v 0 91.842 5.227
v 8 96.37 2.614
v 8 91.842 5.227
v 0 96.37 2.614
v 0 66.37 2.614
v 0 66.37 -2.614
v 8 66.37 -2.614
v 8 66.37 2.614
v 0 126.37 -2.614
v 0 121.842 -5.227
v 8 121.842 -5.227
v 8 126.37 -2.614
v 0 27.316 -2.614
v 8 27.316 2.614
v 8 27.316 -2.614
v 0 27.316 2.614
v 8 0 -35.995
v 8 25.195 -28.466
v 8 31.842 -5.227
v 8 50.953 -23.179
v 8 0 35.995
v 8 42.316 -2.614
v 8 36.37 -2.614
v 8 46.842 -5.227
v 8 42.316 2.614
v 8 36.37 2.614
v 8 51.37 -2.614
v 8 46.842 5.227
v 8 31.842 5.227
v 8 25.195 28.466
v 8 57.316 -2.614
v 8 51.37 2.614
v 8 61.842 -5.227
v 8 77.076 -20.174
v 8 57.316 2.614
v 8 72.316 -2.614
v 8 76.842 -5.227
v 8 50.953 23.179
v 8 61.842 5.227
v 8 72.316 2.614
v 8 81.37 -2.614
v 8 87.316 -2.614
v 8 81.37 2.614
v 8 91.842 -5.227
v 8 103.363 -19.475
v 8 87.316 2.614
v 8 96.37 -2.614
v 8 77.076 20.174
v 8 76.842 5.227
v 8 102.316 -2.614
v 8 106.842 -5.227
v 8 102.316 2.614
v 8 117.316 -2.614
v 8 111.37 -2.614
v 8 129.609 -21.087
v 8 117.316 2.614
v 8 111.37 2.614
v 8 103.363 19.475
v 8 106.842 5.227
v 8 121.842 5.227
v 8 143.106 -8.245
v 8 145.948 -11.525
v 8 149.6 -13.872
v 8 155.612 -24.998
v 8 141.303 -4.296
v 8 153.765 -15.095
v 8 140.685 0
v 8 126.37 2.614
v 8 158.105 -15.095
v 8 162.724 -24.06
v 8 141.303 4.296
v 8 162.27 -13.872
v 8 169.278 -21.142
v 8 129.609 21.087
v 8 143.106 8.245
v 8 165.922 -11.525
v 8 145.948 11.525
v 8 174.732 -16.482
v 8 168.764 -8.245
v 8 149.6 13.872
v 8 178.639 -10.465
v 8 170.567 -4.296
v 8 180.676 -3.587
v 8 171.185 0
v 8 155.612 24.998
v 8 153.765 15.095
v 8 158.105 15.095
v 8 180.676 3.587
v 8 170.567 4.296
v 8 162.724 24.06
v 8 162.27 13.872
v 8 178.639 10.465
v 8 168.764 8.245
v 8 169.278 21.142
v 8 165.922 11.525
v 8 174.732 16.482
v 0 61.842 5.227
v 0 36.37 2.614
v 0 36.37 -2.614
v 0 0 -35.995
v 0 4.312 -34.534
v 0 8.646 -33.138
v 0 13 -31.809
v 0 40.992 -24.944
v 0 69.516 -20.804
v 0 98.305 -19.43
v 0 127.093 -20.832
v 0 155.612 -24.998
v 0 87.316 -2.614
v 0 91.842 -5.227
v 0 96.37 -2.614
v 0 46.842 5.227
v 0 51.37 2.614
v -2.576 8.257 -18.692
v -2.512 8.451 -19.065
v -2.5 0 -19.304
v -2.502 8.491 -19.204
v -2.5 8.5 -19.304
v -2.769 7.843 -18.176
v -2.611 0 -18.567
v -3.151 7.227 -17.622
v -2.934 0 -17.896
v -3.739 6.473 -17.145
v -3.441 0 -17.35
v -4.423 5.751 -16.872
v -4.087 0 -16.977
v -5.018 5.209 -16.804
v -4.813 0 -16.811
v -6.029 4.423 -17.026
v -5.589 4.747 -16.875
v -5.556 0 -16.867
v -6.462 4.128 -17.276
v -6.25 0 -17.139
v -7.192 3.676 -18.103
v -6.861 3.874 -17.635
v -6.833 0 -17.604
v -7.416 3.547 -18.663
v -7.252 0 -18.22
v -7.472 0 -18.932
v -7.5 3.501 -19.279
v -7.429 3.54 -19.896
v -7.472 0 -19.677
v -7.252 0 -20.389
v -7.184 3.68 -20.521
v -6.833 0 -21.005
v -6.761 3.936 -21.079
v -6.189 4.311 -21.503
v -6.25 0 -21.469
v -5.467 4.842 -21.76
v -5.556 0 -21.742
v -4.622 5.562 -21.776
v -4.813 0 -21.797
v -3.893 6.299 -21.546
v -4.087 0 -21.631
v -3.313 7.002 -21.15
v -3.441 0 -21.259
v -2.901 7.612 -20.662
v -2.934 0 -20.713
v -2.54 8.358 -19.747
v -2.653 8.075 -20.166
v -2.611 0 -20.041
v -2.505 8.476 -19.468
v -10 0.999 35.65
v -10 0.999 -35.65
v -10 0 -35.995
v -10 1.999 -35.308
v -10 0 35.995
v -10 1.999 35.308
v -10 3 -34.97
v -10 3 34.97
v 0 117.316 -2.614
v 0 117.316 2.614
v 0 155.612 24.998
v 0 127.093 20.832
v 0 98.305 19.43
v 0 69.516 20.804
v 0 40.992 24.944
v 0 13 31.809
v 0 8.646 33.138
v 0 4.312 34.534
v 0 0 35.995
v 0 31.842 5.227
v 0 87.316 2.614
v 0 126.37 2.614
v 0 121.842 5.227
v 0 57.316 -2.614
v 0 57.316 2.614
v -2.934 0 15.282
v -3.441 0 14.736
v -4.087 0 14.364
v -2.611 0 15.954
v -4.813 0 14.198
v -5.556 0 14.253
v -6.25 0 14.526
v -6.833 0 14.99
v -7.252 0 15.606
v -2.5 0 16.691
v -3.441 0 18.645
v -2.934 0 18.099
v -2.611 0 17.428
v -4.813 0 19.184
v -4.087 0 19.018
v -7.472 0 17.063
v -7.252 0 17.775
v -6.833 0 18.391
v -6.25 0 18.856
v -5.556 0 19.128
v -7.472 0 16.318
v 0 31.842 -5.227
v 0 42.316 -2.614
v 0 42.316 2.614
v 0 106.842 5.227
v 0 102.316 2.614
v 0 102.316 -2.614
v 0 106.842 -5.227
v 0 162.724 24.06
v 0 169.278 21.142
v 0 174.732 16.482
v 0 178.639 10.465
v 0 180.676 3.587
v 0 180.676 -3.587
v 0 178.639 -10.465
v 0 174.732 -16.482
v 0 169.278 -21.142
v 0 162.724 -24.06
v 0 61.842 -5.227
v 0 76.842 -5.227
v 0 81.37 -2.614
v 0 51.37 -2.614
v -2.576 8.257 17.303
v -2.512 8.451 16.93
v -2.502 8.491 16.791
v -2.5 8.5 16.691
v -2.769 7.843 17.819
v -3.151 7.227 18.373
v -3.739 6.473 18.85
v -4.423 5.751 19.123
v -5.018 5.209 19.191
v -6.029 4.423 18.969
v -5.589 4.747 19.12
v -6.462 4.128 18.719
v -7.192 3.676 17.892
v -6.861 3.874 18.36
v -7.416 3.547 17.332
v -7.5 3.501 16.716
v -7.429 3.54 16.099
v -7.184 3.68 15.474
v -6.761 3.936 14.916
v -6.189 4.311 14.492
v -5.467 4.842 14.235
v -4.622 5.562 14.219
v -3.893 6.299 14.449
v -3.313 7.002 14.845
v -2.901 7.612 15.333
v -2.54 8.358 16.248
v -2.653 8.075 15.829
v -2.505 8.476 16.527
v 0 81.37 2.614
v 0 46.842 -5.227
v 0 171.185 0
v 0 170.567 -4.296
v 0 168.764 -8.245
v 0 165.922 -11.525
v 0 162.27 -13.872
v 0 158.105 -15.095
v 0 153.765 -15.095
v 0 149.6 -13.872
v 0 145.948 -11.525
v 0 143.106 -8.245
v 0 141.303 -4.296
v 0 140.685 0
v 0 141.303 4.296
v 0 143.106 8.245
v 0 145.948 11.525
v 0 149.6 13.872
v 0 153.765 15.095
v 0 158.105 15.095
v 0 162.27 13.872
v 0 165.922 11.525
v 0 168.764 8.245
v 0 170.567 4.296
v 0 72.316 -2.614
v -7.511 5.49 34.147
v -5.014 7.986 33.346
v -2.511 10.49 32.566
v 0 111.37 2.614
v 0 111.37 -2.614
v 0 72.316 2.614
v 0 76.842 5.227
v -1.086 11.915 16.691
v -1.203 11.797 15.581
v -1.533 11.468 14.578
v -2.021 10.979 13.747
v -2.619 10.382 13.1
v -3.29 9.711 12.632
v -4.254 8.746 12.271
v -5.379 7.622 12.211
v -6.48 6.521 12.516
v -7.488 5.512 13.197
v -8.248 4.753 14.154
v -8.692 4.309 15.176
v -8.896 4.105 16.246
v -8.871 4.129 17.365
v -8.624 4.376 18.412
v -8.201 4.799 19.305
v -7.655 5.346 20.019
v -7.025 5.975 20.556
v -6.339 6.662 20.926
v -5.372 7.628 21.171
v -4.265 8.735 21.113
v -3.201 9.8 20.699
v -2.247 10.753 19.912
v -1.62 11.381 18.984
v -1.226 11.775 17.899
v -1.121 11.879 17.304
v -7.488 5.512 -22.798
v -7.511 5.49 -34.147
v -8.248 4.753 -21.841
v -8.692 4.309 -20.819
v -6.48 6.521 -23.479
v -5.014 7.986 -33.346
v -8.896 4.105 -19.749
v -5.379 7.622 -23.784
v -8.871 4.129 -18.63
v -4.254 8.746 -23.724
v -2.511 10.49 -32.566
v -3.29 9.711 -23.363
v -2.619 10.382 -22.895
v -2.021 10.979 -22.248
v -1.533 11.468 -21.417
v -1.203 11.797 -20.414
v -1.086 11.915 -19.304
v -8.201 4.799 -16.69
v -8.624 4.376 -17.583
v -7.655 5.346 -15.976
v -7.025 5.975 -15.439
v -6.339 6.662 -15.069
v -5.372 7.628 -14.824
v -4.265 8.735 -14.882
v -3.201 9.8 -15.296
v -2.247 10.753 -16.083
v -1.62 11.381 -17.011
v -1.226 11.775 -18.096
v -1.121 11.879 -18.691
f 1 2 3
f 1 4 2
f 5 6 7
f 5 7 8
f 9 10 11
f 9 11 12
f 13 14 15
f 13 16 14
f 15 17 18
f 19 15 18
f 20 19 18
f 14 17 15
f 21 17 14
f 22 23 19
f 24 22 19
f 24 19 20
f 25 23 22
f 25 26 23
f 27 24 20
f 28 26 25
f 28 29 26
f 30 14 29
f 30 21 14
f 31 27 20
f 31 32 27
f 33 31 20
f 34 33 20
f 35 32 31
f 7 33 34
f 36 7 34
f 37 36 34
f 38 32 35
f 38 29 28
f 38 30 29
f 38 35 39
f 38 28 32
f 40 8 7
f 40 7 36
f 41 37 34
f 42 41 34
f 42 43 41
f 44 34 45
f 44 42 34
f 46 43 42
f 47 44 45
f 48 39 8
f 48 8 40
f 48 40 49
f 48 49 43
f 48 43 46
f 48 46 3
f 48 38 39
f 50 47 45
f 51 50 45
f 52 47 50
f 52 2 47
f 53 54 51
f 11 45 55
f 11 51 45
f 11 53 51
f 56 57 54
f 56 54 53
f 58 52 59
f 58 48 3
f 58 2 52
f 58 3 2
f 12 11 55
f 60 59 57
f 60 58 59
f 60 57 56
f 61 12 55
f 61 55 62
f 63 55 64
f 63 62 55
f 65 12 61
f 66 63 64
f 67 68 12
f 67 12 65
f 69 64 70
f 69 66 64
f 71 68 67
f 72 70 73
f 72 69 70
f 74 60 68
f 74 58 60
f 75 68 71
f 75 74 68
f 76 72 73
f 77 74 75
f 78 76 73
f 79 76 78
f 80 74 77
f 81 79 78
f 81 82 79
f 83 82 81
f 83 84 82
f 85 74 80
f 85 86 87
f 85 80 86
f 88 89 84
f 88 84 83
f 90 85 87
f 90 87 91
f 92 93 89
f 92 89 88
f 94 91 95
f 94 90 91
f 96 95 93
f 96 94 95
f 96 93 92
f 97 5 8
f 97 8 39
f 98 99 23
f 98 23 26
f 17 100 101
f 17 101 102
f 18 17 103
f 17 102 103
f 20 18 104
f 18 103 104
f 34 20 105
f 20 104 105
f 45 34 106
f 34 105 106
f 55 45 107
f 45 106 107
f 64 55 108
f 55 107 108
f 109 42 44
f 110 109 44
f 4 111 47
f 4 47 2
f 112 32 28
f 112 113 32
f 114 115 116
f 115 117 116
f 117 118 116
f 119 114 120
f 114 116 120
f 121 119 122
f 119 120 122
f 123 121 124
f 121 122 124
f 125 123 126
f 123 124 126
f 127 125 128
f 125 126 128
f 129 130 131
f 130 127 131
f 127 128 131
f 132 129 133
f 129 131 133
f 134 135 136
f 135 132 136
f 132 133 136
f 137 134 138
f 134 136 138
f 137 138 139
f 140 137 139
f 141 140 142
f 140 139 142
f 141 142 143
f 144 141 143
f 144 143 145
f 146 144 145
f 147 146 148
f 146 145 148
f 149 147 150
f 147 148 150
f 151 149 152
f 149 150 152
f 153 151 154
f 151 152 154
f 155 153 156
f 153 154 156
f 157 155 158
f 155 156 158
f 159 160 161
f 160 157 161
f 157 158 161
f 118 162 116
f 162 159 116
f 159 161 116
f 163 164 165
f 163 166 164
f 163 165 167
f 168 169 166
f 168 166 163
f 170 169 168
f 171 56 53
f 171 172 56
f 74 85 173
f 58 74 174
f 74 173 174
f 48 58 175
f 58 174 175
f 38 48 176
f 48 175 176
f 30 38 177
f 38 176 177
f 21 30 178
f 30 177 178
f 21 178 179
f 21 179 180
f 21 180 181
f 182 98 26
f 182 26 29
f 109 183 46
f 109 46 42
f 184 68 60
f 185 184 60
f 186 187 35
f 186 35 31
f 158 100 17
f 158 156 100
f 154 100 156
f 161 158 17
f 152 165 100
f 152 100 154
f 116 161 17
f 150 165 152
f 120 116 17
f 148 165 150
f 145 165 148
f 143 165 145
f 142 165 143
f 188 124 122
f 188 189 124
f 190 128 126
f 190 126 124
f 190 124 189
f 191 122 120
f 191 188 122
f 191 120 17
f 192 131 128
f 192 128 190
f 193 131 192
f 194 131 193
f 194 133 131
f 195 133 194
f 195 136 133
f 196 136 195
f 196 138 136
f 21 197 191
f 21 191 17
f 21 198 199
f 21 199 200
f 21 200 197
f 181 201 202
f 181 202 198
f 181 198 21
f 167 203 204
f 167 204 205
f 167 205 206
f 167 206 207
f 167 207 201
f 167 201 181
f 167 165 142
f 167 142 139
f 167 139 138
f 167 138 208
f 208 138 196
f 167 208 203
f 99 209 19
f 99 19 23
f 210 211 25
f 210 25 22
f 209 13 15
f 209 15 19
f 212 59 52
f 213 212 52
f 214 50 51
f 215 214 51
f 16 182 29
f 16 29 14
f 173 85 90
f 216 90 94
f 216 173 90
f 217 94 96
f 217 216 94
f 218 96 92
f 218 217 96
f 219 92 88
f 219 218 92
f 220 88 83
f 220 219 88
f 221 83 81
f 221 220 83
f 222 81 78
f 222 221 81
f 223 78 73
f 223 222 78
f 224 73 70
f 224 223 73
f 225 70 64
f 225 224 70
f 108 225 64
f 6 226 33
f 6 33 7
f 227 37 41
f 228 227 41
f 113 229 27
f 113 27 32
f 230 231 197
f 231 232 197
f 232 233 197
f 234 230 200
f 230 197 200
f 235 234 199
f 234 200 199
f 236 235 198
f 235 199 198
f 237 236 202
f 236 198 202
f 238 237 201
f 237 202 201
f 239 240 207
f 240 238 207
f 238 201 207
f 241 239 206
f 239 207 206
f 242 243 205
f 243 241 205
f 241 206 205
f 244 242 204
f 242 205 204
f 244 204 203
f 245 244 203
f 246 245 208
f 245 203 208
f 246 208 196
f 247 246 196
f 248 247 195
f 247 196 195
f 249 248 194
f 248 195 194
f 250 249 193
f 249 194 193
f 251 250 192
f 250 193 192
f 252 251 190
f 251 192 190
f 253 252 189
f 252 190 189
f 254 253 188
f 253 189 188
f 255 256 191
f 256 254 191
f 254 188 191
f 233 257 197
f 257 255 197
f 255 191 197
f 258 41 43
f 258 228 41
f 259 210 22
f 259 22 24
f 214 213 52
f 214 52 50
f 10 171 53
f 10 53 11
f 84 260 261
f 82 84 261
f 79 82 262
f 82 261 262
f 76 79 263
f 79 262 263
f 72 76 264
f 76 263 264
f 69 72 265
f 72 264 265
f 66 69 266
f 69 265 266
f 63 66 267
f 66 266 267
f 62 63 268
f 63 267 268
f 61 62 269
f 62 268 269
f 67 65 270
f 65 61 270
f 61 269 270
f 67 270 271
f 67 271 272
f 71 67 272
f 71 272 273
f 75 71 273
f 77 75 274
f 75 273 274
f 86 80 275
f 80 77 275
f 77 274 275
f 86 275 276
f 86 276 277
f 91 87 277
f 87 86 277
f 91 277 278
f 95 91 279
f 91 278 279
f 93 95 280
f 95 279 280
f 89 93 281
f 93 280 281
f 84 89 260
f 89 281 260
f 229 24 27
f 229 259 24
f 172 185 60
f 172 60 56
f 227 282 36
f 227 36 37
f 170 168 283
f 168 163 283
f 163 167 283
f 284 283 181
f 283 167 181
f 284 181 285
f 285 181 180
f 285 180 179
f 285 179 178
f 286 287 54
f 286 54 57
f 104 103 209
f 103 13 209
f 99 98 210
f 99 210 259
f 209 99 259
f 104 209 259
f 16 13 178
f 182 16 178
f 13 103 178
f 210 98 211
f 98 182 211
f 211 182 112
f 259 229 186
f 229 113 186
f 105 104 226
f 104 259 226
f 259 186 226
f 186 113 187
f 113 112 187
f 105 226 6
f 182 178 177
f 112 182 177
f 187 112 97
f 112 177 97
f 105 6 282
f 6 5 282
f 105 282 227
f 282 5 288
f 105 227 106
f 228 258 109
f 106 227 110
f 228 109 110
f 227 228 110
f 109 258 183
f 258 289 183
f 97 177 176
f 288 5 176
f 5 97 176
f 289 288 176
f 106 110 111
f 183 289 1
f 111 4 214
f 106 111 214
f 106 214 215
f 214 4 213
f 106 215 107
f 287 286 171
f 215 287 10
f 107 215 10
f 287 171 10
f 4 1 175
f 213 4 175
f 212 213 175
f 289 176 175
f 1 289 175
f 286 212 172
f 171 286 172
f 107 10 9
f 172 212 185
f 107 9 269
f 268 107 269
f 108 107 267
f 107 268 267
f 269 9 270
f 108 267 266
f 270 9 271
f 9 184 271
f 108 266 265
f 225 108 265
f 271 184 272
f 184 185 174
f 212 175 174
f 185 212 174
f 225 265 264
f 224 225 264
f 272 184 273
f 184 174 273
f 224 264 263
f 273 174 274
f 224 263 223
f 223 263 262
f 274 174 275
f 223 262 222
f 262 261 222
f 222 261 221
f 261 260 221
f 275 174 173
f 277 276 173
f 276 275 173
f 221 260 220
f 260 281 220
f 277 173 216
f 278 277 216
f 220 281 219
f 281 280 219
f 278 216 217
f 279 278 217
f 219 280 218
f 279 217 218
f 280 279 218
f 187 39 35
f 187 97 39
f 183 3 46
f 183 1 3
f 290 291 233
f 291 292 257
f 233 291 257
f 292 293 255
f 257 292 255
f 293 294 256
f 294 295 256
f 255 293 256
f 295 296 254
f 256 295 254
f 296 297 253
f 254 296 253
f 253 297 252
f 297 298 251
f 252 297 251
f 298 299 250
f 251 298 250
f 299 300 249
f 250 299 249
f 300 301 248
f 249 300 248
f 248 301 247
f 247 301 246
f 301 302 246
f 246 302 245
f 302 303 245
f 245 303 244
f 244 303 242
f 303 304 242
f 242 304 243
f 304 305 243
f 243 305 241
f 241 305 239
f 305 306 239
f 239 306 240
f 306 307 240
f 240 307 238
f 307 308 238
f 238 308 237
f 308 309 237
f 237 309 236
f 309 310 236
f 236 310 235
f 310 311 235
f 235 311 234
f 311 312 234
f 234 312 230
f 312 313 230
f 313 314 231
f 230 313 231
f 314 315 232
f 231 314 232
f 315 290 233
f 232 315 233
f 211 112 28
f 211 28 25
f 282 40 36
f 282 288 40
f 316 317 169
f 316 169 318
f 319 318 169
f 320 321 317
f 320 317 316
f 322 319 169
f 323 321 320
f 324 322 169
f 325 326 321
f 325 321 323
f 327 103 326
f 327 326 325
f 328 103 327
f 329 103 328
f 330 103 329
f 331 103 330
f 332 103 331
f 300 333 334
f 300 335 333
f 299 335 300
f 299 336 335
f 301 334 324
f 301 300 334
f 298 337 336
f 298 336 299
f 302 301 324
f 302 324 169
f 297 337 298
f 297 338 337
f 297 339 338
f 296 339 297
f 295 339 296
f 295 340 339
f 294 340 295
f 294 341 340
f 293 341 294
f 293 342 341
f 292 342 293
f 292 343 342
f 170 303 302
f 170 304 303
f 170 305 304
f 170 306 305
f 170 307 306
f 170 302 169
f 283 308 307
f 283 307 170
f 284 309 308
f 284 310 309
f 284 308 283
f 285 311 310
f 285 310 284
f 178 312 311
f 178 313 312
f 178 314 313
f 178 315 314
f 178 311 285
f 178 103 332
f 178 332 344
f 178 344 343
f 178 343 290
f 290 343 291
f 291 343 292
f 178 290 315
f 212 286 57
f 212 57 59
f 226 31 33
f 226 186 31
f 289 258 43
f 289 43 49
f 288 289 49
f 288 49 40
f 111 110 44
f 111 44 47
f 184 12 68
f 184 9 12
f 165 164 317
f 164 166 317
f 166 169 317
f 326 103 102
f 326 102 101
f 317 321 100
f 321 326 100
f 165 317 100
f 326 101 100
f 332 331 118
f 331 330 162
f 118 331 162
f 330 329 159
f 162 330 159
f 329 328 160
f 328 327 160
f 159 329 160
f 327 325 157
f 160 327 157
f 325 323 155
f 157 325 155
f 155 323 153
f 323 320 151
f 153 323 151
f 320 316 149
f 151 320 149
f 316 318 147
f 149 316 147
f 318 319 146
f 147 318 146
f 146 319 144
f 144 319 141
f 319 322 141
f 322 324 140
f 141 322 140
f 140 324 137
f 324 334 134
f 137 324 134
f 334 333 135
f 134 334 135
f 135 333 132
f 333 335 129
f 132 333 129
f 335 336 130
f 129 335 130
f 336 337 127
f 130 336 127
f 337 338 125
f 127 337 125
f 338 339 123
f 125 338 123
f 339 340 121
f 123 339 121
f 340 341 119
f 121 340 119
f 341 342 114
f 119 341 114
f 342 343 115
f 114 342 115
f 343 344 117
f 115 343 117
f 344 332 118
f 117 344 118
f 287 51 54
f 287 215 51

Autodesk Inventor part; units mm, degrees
ref_plane "YZ Plane" through (0, 0, 0) normal (1, 0, 0) x (0, 1, 0)
ref_plane "XZ Plane" through (0, 0, 0) normal (0, 1, 0) x (-1, 0, 0)
ref_plane "XY Plane" through (0, 0, 0) normal (0, 0, 1) x (1, 0, 0)
sketch "Sketch1" plane through (0, 0, 0) normal (1, 0, 0) x (0, 1, 0)
  line L0 (0, 0) -> (155.9349, 0)
  circle A0 centre (155.9349, 0) radius 15.25
  circle A1 centre (155.9349, 0) radius 25
  line L1 (155.6119, 24.9979) -> (0, 35.995)
  line L2 (0, 0) -> (0, 35.995)
  line L3 (155.6119, -24.9979) -> (0, -35.995)
  line L4 (0, 0) -> (0, -35.995)
  arc A2 (0, 35.995) -> (155.6119, 24.9979) centre (98.1634, 318.5597) ccw
  arc A3 (155.6119, -24.9979) -> (0, -35.995) centre (98.1634, -318.5597) ccw
  point P0 (155.6119, -24.9979)
  dimension "d2" = 50
  dimension "d0" = 155.9349
  dimension "d1" = 30.5
  dimension "d3" = 156
extrude "Extrusion1" add sketch "Sketch1" along normal blind 8 contours L2 A2 A1 L0 | L0 A1 A3 L4 | A1 A2 A3
sketch "Sketch2" plane through (0, 0, 0) normal (-1, 0, 0) x (0, 0, 1)
  arc A0 (24.9979, 155.6119) -> (-24.9979, 155.6119) centre (0, 155.9349) ccw projected
  arc A1 (-35.995, 0) -> (-24.9979, 155.6119) centre (-318.5597, 98.1634) ccw projected
  line L0 (35.995, 0) -> (-35.995, 0) projected
  arc A2 (24.9979, 155.6119) -> (35.995, 0) centre (318.5597, 98.1634) ccw projected
  circle A3 centre (0, 155.9349) radius 15.25 projected
  line L1 (0, 0) -> (0, 13)
  line L2 (0, 13) -> (-31.8089, 13)
  arc A4 (-35.995, 0) -> (-24.9979, 155.6119) centre (-318.5597, 98.1634) ccw projected
  line L3 (0, 13) -> (31.8089, 13)
  arc A5 (24.9979, 155.6119) -> (35.995, 0) centre (318.5597, 98.1634) ccw projected
  point P0 (-31.8089, 13)
  point P1 (31.8089, 13)
  dimension "d6" = 13
extrude "Extrusion2" add sketch "Sketch2" along normal blind 10 contours A2 L0 L1 L3 | L2 L1 L0 A1
chamfer "Chamfer1" distance 10 angle 45 1 edges at (-10, 13, 0)
sketch "Sketch3" plane through (0, 0, 0) normal (-1, 0, 0) x (0, 0, 1)
  line L0 (-31.8089, 13) -> (31.8089, 13) projected
  line L1 (0, 13) -> (0, 140.6849)
  circle A0 centre (0, 155.9349) radius 15.25 projected
  line L2 (-5.2273, 76.8425) -> (-2.6137, 81.3695)
  line L3 (-2.6137, 81.3695) -> (2.6137, 81.3695)
  line L4 (2.6137, 81.3695) -> (5.2273, 76.8425)
  line L5 (5.2273, 76.8425) -> (2.6137, 72.3155)
  line L6 (2.6137, 72.3155) -> (-2.6137, 72.3155)
  line L7 (-2.6137, 72.3155) -> (-5.2273, 76.8425)
  line L8 (-5.2273, 91.8425) -> (-2.6137, 96.3695)
  line L9 (-2.6137, 96.3695) -> (2.6137, 96.3695)
  line L10 (2.6137, 96.3695) -> (5.2273, 91.8425)
  line L11 (5.2273, 91.8425) -> (2.6137, 87.3155)
  line L12 (2.6137, 87.3155) -> (-2.6137, 87.3155)
  line L13 (-2.6137, 87.3155) -> (-5.2273, 91.8425)
  line L14 (-5.2273, 106.8425) -> (-2.6137, 111.3695)
  line L15 (-2.6137, 111.3695) -> (2.6137, 111.3695)
  line L16 (2.6137, 111.3695) -> (5.2273, 106.8425)
  line L17 (5.2273, 106.8425) -> (2.6137, 102.3155)
  line L18 (2.6137, 102.3155) -> (-2.6137, 102.3155)
  line L19 (-2.6137, 102.3155) -> (-5.2273, 106.8425)
  line L20 (-5.2273, 121.8425) -> (-2.6137, 126.3695)
  line L21 (-2.6137, 126.3695) -> (2.6137, 126.3695)
  line L22 (2.6137, 126.3695) -> (5.2273, 121.8425)
  line L23 (5.2273, 121.8425) -> (2.6137, 117.3155)
  line L24 (2.6137, 117.3155) -> (-2.6137, 117.3155)
  line L25 (-2.6137, 117.3155) -> (-5.2273, 121.8425)
  line L26 (-2.6137, 66.3695) -> (2.6137, 66.3695)
  line L27 (-5.2273, 61.8425) -> (-2.6137, 66.3695)
  line L28 (2.6137, 66.3695) -> (5.2273, 61.8425)
  line L29 (-2.6137, 57.3155) -> (-5.2273, 61.8425)
  line L30 (5.2273, 61.8425) -> (2.6137, 57.3155)
  line L31 (2.6137, 57.3155) -> (-2.6137, 57.3155)
  line L32 (-2.6137, 51.3695) -> (2.6137, 51.3695)
  line L33 (-5.2273, 46.8425) -> (-2.6137, 51.3695)
  line L34 (2.6137, 51.3695) -> (5.2273, 46.8425)
  line L35 (-2.6137, 42.3155) -> (-5.2273, 46.8425)
  line L36 (5.2273, 46.8425) -> (2.6137, 42.3155)
  line L37 (2.6137, 42.3155) -> (-2.6137, 42.3155)
  line L38 (-2.6137, 36.3695) -> (2.6137, 36.3695)
  line L39 (-5.2273, 31.8425) -> (-2.6137, 36.3695)
  line L40 (2.6137, 36.3695) -> (5.2273, 31.8425)
  line L41 (-2.6137, 27.3155) -> (-5.2273, 31.8425)
  line L42 (5.2273, 31.8425) -> (2.6137, 27.3155)
  line L43 (2.6137, 27.3155) -> (-2.6137, 27.3155)
  line L44 (0, 76.8425) -> (20.7534, 76.8425)
  point P0 (0, 0)
  point P1 (0, 81.3695)
  point P2 (0, 91.8425)
  point P3 (0, 96.3695)
  point P4 (0, 106.8425)
  point P5 (0, 111.3695)
  point P6 (0, 121.8425)
  point P7 (0, 126.3695)
  point P8 (0, 66.3695)
  point P9 (0, 61.8425)
  point P10 (0, 51.3695)
  point P11 (0, 46.8425)
  point P12 (0, 36.3695)
  point P13 (0, 31.8425)
  dimension "d12" = 9.054
  dimension "d15" = 15
  dimension "d22" = 15
extrude "Extrusion3" cut sketch "Sketch3" against normal blind 12 contours L43 L41 L39 L38 L1 | L1 L38 L40 L42 L43 | L24 L25 L20 L21 L1 | L1 L21 L22 L23 L24 | L18 L19 L14 L15 L1 | L1 L15 L16 L17 L18 | L12 L13 L8 L9 L1 | L1 L9 L10 L11 L12 | L6 L7 L2 L3 L1 | L1 L44 L5 L6 | L31 L29 L27 L26 L1 | L1 L26 L28 L30 L31 | L37 L35 L33 L32 L1 | L1 L32 L34 L36 L37 | L1 L3 L4 L44
sketch "Sketch4" plane through (8, 0, -35.995) normal (0, -1, 0) x (1, 0, 0)
  line L0 (-18, 0) -> (0, 0) projected
  line L1 (0, 71.9901) -> (0, 0) projected
  line L2 (-18, 71.9901) -> (0, 71.9901) projected
  line L3 (-18, 0) -> (-18, 71.9901) projected
  line L4 (-18, 71.9901) -> (-9, 71.9901)
  line L5 (-18, 71.9901) -> (-8, 71.9901)
  line L6 (-8, 0) -> (-8, 71.9901)
  line L7 (-8, 67.8039) -> (-8, 55.4246) projected
  line L8 (-13, 71.9901) -> (-13, 0)
  line L9 (-8, 33.3814) -> (0, 33.3814) projected
  line L10 (0, 33.3814) -> (-18, 33.3814)
  line L11 (-13, 71.9901) -> (-13, 33.3814)
  line L12 (-13, 33.3814) -> (-13, 0)
  circle A0 centre (-13, 16.6907) radius 2.5
  circle A1 centre (-13, 52.6857) radius 2.5
  point P0 (-8, 35.995)
  point P1 (-8, 60.9929)
  dimension "d29" = 5
  dimension "d30" = 5
extrude "Extrusion4" cut sketch "Sketch4" against normal blind 20 contours A0 L8 | L8 A0 | A1 L8 | L8 A1
chamfer "Chamfer2" distance 2 angle 45 2 edges at (-7.5, 5.5005, -19.3043) (-7.5, 5.5005, 16.6907)
properties part number "HolderB" material "Acetal Resin, Black"
